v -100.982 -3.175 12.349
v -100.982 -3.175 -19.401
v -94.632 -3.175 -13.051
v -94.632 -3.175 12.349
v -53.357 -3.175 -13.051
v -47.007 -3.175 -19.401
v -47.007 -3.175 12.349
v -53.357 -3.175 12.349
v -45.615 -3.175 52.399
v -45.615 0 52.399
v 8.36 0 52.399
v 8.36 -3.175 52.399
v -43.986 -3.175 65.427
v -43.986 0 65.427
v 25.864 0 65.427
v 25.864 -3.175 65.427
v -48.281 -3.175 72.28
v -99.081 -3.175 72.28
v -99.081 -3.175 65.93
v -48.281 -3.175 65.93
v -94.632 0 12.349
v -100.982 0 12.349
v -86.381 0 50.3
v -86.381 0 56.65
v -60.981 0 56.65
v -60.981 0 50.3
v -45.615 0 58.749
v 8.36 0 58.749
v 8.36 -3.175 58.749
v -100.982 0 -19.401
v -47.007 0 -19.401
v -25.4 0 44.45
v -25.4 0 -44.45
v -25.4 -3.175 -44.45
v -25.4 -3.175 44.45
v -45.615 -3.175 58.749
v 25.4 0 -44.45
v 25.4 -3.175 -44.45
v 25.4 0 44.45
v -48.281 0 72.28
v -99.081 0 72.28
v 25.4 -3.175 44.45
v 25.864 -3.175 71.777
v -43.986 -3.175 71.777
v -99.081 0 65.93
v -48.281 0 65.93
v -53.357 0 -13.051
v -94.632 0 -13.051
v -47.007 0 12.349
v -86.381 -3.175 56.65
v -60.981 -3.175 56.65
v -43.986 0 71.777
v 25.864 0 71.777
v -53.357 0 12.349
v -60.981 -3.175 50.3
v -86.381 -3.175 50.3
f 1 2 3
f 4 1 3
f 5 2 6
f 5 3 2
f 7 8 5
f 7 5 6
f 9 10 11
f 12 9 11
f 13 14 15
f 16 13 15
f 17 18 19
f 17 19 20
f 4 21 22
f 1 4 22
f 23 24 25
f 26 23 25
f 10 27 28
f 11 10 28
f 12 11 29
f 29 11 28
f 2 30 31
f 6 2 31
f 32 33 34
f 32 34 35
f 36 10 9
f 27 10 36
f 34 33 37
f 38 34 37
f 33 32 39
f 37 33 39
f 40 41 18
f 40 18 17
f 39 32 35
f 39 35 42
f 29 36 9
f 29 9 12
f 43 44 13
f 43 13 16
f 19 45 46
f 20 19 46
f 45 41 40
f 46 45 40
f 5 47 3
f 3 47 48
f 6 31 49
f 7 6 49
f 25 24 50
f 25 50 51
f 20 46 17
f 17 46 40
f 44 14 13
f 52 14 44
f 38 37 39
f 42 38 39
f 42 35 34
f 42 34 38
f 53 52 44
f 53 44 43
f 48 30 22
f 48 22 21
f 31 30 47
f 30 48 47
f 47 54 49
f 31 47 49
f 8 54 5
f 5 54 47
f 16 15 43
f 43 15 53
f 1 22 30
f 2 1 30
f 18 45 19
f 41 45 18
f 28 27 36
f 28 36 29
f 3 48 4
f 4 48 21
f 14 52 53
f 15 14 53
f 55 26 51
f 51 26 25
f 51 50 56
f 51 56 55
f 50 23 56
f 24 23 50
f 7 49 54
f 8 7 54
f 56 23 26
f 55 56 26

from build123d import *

# Parameters (mm, degrees)
F0_W     = 50.8
F0_H     = 88.9
F1_DEPTH = 3.175
F3_DEPTH = 3.175
F4_W     = 50.8
F4_H     = 6.35
F4_W_2   = 25.4
F4_W_3   = 53.975
F4_W_4   = 69.85
F5_DEPTH = 3.175


with BuildPart() as f1:
    # F0 (on Front) → F1 (new body)
    with BuildSketch(Plane.XZ):
        Rectangle(F0_W, F0_H)
    extrude(amount=F1_DEPTH)


with BuildPart() as f3:
    # F2 (on Front) → F3 (new body)
    with BuildSketch(Plane.XZ):
        Polygon((-94.632274, 12.349087), (-100.982274, 12.349087), (-100.982274, -19.400913), (-47.007274, -19.400913), (-47.007274, 12.349087), (-53.357274, 12.349087), (-53.357274, -13.050913), (-94.632274, -13.050913), align=None)
    extrude(amount=F3_DEPTH)


with BuildPart() as f5:
    # F4 (on Front) → F5 (new body)
    with BuildSketch(Plane.XZ):
        with Locations((-73.681198, 69.10545)):
            Rectangle(F4_W, F4_H)
        with Locations((-73.681198, 53.474675)):
            Rectangle(F4_W_2, F4_H)
        with Locations((-18.627363, 55.574397)):
            Rectangle(F4_W_3, F4_H)
        with Locations((-9.061456, 68.601648)):
            Rectangle(F4_W_4, F4_H)
    extrude(amount=F5_DEPTH)


solid = Compound([f1.part, f3.part, f5.part])
